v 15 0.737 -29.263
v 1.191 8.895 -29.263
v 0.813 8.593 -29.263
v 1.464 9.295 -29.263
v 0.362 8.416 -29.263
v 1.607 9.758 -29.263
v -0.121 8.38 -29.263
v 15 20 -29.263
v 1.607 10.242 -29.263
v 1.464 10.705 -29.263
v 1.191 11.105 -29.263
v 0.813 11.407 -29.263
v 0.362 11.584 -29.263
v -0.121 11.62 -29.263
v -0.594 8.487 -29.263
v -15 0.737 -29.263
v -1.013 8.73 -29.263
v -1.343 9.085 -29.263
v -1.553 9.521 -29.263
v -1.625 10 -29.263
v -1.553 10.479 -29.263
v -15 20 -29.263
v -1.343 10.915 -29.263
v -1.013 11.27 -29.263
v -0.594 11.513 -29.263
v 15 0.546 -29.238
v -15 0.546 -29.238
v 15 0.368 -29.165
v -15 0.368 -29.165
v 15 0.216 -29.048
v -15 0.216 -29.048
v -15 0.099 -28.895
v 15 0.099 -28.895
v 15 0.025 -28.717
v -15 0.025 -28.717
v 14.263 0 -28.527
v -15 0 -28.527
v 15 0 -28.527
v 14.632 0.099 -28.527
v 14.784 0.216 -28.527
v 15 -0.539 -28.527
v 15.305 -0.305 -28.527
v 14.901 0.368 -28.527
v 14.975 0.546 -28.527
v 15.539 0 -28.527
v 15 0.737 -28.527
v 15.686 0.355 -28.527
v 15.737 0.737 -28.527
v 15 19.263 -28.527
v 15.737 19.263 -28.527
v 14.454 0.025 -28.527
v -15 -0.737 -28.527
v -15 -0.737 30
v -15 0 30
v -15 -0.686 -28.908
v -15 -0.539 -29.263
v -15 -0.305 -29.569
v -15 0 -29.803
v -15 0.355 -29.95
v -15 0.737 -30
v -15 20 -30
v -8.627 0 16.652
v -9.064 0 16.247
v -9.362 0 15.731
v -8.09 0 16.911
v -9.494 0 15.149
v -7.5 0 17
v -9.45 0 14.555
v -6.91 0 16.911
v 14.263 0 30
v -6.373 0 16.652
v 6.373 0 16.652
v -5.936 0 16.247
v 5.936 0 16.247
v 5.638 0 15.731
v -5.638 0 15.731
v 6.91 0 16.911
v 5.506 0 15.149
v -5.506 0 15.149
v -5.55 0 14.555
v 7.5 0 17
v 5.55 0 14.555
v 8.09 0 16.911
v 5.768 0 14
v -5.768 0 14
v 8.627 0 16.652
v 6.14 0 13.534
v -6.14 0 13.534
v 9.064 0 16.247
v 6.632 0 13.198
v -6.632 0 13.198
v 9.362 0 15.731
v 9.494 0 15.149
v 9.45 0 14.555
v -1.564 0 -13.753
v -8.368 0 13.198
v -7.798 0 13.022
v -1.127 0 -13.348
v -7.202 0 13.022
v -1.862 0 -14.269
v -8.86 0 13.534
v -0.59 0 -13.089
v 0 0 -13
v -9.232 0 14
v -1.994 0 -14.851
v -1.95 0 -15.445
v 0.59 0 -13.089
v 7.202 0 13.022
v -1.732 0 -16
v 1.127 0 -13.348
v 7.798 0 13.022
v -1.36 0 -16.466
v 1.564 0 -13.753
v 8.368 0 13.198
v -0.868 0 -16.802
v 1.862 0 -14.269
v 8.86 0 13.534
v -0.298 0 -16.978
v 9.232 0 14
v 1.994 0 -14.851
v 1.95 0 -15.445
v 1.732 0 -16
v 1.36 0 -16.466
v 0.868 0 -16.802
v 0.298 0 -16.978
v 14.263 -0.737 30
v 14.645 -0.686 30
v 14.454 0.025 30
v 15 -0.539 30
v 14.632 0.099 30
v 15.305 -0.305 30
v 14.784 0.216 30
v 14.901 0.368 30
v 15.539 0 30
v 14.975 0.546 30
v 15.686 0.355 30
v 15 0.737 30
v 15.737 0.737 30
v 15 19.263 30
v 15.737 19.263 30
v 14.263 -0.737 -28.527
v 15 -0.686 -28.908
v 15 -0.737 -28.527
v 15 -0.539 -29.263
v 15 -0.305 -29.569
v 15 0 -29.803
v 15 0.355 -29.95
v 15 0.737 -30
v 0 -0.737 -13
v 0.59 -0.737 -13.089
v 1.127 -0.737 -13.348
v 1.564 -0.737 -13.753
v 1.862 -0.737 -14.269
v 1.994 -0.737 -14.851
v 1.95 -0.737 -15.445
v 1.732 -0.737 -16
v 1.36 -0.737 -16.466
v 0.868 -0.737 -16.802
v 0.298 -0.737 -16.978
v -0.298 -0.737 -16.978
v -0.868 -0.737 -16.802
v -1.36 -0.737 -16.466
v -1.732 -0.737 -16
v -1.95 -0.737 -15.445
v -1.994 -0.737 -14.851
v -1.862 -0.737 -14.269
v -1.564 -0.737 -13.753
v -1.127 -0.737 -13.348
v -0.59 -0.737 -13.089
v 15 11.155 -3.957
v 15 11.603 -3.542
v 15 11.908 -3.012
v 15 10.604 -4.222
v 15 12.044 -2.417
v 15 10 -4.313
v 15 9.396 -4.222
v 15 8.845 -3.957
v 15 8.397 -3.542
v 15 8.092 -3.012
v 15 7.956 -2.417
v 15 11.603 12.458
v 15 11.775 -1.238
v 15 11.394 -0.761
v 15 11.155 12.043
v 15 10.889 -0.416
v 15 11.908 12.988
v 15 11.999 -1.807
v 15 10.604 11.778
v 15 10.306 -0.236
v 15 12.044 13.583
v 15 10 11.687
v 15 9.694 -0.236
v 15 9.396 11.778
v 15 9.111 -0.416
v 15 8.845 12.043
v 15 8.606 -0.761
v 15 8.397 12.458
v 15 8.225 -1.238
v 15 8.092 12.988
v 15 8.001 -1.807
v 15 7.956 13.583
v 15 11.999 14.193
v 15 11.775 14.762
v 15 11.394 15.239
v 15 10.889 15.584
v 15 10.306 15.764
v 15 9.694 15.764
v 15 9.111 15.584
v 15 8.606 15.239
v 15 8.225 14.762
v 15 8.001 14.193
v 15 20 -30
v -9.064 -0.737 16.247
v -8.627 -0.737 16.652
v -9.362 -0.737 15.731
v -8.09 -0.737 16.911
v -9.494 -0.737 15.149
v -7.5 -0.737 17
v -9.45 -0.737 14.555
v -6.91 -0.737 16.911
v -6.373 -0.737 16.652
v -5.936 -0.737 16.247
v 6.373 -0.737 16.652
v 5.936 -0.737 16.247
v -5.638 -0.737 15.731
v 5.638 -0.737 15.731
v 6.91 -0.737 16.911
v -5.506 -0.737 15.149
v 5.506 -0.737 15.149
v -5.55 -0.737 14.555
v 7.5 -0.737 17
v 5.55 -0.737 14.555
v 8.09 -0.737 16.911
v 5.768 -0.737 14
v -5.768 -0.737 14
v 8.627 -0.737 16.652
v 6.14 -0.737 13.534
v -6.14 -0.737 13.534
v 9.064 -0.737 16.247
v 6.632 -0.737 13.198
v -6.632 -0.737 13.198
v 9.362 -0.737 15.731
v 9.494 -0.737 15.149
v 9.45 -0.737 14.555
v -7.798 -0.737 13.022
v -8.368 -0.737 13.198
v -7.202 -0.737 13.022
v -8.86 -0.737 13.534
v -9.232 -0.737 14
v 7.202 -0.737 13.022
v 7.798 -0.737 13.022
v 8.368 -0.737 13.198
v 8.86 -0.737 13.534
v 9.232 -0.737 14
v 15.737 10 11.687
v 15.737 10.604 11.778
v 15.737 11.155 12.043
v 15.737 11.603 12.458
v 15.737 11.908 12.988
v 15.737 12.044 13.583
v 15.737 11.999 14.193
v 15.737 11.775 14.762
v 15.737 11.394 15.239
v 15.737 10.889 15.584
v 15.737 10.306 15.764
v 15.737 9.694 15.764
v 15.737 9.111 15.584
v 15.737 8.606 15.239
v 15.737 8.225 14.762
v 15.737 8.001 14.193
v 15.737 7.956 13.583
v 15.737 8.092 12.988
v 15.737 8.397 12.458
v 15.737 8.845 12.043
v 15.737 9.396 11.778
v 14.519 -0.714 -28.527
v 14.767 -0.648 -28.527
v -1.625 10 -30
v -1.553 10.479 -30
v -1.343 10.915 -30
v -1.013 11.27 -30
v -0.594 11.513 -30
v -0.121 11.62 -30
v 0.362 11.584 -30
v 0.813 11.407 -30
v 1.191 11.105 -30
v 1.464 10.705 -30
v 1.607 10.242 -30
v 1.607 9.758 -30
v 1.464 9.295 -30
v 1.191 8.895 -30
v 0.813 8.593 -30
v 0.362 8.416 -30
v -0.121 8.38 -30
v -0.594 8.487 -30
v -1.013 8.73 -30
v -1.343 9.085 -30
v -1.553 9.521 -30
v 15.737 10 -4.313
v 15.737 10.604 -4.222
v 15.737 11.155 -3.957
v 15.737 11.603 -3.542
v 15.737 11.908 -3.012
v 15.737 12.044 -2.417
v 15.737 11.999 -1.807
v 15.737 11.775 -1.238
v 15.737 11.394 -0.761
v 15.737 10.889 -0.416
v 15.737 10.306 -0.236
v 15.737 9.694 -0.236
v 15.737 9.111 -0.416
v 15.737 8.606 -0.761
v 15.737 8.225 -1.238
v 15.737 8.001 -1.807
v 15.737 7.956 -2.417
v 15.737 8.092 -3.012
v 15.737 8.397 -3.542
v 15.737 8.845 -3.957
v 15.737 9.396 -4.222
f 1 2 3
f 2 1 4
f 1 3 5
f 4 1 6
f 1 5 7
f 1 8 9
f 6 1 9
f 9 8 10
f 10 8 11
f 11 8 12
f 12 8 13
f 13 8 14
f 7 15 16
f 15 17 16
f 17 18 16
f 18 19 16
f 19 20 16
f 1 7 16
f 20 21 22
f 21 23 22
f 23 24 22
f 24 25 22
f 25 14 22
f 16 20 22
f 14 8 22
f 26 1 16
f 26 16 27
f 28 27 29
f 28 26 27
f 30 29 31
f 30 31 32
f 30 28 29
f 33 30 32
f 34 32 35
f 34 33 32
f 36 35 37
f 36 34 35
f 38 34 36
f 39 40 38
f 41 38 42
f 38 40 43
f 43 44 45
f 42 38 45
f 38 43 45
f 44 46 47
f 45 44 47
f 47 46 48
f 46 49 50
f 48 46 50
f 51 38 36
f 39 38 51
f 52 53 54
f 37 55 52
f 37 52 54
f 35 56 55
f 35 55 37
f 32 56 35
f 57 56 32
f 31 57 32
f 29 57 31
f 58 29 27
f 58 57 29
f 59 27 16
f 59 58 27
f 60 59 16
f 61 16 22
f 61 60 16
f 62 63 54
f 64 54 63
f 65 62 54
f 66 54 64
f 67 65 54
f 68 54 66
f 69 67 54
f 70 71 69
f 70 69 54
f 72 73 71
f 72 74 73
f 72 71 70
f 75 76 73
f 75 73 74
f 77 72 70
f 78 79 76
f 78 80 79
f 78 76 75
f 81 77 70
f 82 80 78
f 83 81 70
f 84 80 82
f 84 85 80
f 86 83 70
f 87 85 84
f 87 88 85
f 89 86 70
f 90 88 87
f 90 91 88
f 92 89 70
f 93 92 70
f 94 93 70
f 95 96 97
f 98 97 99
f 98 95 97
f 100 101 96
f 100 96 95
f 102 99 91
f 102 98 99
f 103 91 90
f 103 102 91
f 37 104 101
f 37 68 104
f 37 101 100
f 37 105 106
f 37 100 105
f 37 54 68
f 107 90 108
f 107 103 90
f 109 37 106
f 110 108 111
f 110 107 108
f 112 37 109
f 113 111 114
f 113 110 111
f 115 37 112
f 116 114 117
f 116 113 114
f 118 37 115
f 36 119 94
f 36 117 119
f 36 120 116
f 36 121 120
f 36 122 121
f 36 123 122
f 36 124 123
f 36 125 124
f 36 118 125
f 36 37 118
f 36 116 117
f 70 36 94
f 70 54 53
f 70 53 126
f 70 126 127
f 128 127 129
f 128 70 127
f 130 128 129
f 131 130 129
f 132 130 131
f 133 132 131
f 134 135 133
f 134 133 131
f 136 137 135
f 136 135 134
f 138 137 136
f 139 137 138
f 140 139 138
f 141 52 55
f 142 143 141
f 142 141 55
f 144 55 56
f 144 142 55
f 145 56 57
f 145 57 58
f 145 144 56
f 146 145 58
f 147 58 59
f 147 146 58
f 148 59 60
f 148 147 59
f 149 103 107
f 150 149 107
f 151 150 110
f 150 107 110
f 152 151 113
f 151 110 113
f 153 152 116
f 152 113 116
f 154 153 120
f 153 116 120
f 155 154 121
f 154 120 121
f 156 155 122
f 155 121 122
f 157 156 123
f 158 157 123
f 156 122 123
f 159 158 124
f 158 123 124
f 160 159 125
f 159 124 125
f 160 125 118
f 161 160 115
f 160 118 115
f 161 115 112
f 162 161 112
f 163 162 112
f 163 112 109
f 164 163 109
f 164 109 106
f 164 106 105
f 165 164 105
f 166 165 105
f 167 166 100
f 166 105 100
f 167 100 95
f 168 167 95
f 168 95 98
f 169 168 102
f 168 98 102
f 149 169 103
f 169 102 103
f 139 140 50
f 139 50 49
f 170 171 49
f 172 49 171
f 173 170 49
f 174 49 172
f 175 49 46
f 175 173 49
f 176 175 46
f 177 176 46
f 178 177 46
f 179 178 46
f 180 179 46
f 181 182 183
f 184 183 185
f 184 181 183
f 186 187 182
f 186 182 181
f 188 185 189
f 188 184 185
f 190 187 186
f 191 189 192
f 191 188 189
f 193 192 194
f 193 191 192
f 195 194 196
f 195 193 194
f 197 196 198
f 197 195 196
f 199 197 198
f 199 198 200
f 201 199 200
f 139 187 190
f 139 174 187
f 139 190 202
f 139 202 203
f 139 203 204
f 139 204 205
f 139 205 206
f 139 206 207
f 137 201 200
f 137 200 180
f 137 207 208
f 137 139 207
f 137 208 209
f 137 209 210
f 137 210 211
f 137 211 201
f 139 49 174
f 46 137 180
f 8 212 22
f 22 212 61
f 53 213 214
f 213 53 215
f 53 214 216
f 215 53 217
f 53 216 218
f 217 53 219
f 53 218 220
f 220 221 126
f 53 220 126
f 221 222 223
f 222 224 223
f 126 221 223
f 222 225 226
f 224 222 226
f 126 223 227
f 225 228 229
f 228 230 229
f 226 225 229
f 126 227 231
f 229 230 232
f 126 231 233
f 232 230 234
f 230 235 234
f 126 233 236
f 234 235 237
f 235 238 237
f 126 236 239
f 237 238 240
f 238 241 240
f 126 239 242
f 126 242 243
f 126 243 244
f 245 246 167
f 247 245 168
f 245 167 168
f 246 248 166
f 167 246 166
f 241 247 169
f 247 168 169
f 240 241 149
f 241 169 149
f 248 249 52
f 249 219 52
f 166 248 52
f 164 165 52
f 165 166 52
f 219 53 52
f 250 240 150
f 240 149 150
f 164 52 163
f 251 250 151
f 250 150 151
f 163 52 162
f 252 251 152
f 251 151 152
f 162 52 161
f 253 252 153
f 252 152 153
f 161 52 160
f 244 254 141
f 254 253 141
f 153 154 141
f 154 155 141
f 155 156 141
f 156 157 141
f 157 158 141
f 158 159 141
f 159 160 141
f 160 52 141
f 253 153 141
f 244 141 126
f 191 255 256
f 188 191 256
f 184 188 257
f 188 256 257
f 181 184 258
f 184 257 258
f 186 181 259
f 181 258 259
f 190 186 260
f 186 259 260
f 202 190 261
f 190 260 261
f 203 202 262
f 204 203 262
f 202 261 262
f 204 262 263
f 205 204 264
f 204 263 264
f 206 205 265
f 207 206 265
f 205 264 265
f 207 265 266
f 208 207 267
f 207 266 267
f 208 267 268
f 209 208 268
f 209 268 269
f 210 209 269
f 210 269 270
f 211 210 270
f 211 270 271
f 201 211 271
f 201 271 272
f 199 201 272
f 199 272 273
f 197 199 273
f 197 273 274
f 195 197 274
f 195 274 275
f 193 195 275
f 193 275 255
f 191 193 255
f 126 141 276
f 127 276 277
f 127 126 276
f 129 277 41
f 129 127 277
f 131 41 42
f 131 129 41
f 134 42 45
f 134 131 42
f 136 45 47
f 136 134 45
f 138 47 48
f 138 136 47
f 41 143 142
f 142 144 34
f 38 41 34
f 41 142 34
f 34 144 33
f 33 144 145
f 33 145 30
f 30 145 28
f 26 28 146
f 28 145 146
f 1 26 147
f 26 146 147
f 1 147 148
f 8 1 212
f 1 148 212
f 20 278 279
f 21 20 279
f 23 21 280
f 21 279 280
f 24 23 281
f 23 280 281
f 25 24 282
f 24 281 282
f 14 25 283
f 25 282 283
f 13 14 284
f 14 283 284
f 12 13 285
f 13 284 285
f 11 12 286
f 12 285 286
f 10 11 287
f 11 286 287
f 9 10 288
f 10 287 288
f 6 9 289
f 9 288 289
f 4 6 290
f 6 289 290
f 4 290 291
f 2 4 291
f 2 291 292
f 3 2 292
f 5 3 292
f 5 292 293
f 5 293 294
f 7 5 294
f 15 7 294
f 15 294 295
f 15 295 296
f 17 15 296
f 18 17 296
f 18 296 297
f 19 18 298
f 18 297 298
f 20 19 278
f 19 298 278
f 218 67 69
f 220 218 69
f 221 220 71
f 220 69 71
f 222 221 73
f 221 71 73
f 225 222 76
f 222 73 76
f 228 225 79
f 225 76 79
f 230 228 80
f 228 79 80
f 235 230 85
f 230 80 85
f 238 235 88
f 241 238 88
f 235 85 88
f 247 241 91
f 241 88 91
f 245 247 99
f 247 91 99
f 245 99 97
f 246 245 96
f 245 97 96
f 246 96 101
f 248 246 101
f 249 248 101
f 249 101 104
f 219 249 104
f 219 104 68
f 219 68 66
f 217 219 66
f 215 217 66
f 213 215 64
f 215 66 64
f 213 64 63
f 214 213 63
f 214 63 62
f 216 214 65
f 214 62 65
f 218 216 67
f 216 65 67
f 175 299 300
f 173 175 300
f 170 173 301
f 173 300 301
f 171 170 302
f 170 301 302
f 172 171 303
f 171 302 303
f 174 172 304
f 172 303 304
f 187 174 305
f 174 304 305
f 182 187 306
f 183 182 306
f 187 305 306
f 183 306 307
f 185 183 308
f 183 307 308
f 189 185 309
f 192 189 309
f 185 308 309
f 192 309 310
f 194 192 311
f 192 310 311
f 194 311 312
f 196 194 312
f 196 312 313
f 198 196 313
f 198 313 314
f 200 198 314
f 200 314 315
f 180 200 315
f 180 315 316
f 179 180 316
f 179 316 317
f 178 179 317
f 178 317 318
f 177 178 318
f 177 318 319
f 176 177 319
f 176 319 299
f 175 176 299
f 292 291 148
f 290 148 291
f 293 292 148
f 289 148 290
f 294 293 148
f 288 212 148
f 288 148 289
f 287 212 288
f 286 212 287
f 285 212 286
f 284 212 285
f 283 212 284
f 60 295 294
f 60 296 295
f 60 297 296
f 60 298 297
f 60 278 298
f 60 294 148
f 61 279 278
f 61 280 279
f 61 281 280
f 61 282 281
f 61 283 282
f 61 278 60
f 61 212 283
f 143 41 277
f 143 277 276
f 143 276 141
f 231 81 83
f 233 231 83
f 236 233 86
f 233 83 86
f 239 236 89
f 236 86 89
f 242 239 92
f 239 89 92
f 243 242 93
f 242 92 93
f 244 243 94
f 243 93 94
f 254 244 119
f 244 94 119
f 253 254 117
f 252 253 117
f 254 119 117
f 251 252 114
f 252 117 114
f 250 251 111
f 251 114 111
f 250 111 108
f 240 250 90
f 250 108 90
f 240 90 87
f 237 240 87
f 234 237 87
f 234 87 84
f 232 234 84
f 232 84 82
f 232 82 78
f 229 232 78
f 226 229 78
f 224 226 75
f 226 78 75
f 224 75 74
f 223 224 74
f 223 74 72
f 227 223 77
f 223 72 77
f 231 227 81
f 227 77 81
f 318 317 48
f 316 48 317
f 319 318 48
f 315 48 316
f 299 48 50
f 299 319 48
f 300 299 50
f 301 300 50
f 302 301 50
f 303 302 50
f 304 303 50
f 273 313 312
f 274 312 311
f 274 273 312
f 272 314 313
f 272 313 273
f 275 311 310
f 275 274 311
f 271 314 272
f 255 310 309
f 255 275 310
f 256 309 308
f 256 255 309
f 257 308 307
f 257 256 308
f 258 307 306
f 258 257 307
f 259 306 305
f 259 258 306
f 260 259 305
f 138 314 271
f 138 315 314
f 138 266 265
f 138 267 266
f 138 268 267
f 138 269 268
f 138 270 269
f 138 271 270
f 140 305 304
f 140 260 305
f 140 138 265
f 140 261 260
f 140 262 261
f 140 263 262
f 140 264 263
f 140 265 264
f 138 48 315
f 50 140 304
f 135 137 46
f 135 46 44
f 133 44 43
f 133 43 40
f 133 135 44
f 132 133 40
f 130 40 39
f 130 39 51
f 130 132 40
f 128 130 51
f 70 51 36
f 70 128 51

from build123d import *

# Parameters (mm, degrees)
SKETCH1_W                    = 30
SKETCH1_H                    = 60
SKETCH1_R                    = 2
BASE_FLANGE1_DEPTH           = 0.7366
EDGE_FLANGE1_STRIP_W         = 4.4196
EDGE_FLANGE1_STRIP_H         = 0.7366
EDGE_FLANGE1_STRIP_CUT_DEPTH = 30
EDGE_FLANGE1_DEPTH           = 30
EDGE_FLANGE1_PROFILE_W       = 30
EDGE_FLANGE1_PROFILE_H       = 19.2634
EDGE_FLANGE1_PROFILE_R       = 1.625
EDGE_FLANGE1_FLAT_DEPTH      = 0.7366
EDGE_FLANGE6_STRIP_W         = 4.4196
EDGE_FLANGE6_STRIP_H         = 0.7366
EDGE_FLANGE6_STRIP_CUT_DEPTH = 58.5268
EDGE_FLANGE6_DEPTH           = 58.5268
SKETCH24_R                   = 2.05
CUT_EXTRUDE1_DEPTH           = 409.183232337


# Sheet-metal steps are written as plain solids
with BuildPart() as part:
    # Sketch1 → Base-Flange1 (new body)
    with BuildSketch(Plane(origin=(0, 0, 0), x_dir=(1, 0, 0), z_dir=(0, 1, 0))):
        Rectangle(SKETCH1_W, SKETCH1_H)
        with Locations(Location((7.5, -15, 0), (0, 0, 270))):
            Circle(SKETCH1_R, mode=Mode.SUBTRACT)
        with Locations(Location((0, 15, 0), (0, 0, 270))):
            Circle(SKETCH1_R, mode=Mode.SUBTRACT)
        with Locations(Location((-7.5, -15, 0), (0, 0, 270))):
            Circle(SKETCH1_R, mode=Mode.SUBTRACT)
    extrude(amount=-BASE_FLANGE1_DEPTH)

    # Edge-Flange1 strip (across the edge) → Edge-Flange1 strip cut (cut)
    with BuildSketch(Plane(origin=(15, 0, -30), x_dir=(0, 0, 1), z_dir=(-1, 0, 0))):
        with Locations((-0.7366, -0.3683)):
            Rectangle(EDGE_FLANGE1_STRIP_W, EDGE_FLANGE1_STRIP_H)
    extrude(amount=EDGE_FLANGE1_STRIP_CUT_DEPTH, mode=Mode.SUBTRACT)

    # Edge-Flange1 bend section (across the edge) → Edge-Flange1 (add)
    with BuildSketch(Plane(origin=(15, 0, -30), x_dir=(0, 0, 1), z_dir=(-1, 0, 0))):
        with BuildLine():
            Line((0, 0.7366), (0.7366, 0.7366))
            ThreePointArc((0.7366, 0.7366), (0.952345145, 0.215745145), (1.4732, 0))
            Line((1.4732, 0), (1.4732, -0.7366))
            ThreePointArc((1.4732, -0.7366), (0.43149029, -0.30510971), (0, 0.7366))
        make_face()
    extrude(amount=EDGE_FLANGE1_DEPTH)

    # Edge-Flange1 profile (on flange) → Edge-Flange1 flat (add)
    with BuildSketch(Plane(origin=(0, 0, -30), x_dir=(-1, 0, 0), z_dir=(0, 0, -1))):
        with Locations((0, 10.3683)):
            Rectangle(EDGE_FLANGE1_PROFILE_W, EDGE_FLANGE1_PROFILE_H)
        with Locations((0, 10)):
            Circle(EDGE_FLANGE1_PROFILE_R, mode=Mode.SUBTRACT)
    extrude(amount=-EDGE_FLANGE1_FLAT_DEPTH)

    # Edge-Flange6 strip (across the edge) → Edge-Flange6 strip cut (cut)
    with BuildSketch(Plane(origin=(15, 0, 30), x_dir=(-1, 0, 0), z_dir=(0, 0, -1))):
        with Locations((-1.4732, -0.3683)):
            Rectangle(EDGE_FLANGE6_STRIP_W, EDGE_FLANGE6_STRIP_H)
    extrude(amount=EDGE_FLANGE6_STRIP_CUT_DEPTH, mode=Mode.SUBTRACT)

    # Edge-Flange6 section (across the edge) → Edge-Flange6 (add)
    with BuildSketch(Plane(origin=(15, 0, 30), x_dir=(-1, 0, 0), z_dir=(0, 0, -1))):
        with BuildLine():
            Line((-0.7366, 0.7366), (-0.7366, 19.2634))
            Line((-0.7366, 19.2634), (0, 19.2634))
            Line((0, 19.2634), (0, 0.7366))
            ThreePointArc((0, 0.7366), (0.215745145, 0.215745145), (0.7366, 0))
            Line((0.7366, 0), (0.7366, -0.7366))
            ThreePointArc((0.7366, -0.7366), (-0.30510971, -0.30510971), (-0.7366, 0.7366))
        make_face()
    extrude(amount=EDGE_FLANGE6_DEPTH)

    # Sketch24 → Cut-Extrude1 (cut, through all)
    with BuildSketch(Plane(origin=(385, -11.740421973, -44.873872437), x_dir=(0, 0, -1), z_dir=(1, 0, 0))):
        with Locations((-42.610472437, 21.740421973)):
            Circle(SKETCH24_R)
        with Locations((-58.610472437, 21.740421973)):
            Circle(SKETCH24_R)
    extrude(amount=-CUT_EXTRUDE1_DEPTH, mode=Mode.SUBTRACT)


solid = part.part
